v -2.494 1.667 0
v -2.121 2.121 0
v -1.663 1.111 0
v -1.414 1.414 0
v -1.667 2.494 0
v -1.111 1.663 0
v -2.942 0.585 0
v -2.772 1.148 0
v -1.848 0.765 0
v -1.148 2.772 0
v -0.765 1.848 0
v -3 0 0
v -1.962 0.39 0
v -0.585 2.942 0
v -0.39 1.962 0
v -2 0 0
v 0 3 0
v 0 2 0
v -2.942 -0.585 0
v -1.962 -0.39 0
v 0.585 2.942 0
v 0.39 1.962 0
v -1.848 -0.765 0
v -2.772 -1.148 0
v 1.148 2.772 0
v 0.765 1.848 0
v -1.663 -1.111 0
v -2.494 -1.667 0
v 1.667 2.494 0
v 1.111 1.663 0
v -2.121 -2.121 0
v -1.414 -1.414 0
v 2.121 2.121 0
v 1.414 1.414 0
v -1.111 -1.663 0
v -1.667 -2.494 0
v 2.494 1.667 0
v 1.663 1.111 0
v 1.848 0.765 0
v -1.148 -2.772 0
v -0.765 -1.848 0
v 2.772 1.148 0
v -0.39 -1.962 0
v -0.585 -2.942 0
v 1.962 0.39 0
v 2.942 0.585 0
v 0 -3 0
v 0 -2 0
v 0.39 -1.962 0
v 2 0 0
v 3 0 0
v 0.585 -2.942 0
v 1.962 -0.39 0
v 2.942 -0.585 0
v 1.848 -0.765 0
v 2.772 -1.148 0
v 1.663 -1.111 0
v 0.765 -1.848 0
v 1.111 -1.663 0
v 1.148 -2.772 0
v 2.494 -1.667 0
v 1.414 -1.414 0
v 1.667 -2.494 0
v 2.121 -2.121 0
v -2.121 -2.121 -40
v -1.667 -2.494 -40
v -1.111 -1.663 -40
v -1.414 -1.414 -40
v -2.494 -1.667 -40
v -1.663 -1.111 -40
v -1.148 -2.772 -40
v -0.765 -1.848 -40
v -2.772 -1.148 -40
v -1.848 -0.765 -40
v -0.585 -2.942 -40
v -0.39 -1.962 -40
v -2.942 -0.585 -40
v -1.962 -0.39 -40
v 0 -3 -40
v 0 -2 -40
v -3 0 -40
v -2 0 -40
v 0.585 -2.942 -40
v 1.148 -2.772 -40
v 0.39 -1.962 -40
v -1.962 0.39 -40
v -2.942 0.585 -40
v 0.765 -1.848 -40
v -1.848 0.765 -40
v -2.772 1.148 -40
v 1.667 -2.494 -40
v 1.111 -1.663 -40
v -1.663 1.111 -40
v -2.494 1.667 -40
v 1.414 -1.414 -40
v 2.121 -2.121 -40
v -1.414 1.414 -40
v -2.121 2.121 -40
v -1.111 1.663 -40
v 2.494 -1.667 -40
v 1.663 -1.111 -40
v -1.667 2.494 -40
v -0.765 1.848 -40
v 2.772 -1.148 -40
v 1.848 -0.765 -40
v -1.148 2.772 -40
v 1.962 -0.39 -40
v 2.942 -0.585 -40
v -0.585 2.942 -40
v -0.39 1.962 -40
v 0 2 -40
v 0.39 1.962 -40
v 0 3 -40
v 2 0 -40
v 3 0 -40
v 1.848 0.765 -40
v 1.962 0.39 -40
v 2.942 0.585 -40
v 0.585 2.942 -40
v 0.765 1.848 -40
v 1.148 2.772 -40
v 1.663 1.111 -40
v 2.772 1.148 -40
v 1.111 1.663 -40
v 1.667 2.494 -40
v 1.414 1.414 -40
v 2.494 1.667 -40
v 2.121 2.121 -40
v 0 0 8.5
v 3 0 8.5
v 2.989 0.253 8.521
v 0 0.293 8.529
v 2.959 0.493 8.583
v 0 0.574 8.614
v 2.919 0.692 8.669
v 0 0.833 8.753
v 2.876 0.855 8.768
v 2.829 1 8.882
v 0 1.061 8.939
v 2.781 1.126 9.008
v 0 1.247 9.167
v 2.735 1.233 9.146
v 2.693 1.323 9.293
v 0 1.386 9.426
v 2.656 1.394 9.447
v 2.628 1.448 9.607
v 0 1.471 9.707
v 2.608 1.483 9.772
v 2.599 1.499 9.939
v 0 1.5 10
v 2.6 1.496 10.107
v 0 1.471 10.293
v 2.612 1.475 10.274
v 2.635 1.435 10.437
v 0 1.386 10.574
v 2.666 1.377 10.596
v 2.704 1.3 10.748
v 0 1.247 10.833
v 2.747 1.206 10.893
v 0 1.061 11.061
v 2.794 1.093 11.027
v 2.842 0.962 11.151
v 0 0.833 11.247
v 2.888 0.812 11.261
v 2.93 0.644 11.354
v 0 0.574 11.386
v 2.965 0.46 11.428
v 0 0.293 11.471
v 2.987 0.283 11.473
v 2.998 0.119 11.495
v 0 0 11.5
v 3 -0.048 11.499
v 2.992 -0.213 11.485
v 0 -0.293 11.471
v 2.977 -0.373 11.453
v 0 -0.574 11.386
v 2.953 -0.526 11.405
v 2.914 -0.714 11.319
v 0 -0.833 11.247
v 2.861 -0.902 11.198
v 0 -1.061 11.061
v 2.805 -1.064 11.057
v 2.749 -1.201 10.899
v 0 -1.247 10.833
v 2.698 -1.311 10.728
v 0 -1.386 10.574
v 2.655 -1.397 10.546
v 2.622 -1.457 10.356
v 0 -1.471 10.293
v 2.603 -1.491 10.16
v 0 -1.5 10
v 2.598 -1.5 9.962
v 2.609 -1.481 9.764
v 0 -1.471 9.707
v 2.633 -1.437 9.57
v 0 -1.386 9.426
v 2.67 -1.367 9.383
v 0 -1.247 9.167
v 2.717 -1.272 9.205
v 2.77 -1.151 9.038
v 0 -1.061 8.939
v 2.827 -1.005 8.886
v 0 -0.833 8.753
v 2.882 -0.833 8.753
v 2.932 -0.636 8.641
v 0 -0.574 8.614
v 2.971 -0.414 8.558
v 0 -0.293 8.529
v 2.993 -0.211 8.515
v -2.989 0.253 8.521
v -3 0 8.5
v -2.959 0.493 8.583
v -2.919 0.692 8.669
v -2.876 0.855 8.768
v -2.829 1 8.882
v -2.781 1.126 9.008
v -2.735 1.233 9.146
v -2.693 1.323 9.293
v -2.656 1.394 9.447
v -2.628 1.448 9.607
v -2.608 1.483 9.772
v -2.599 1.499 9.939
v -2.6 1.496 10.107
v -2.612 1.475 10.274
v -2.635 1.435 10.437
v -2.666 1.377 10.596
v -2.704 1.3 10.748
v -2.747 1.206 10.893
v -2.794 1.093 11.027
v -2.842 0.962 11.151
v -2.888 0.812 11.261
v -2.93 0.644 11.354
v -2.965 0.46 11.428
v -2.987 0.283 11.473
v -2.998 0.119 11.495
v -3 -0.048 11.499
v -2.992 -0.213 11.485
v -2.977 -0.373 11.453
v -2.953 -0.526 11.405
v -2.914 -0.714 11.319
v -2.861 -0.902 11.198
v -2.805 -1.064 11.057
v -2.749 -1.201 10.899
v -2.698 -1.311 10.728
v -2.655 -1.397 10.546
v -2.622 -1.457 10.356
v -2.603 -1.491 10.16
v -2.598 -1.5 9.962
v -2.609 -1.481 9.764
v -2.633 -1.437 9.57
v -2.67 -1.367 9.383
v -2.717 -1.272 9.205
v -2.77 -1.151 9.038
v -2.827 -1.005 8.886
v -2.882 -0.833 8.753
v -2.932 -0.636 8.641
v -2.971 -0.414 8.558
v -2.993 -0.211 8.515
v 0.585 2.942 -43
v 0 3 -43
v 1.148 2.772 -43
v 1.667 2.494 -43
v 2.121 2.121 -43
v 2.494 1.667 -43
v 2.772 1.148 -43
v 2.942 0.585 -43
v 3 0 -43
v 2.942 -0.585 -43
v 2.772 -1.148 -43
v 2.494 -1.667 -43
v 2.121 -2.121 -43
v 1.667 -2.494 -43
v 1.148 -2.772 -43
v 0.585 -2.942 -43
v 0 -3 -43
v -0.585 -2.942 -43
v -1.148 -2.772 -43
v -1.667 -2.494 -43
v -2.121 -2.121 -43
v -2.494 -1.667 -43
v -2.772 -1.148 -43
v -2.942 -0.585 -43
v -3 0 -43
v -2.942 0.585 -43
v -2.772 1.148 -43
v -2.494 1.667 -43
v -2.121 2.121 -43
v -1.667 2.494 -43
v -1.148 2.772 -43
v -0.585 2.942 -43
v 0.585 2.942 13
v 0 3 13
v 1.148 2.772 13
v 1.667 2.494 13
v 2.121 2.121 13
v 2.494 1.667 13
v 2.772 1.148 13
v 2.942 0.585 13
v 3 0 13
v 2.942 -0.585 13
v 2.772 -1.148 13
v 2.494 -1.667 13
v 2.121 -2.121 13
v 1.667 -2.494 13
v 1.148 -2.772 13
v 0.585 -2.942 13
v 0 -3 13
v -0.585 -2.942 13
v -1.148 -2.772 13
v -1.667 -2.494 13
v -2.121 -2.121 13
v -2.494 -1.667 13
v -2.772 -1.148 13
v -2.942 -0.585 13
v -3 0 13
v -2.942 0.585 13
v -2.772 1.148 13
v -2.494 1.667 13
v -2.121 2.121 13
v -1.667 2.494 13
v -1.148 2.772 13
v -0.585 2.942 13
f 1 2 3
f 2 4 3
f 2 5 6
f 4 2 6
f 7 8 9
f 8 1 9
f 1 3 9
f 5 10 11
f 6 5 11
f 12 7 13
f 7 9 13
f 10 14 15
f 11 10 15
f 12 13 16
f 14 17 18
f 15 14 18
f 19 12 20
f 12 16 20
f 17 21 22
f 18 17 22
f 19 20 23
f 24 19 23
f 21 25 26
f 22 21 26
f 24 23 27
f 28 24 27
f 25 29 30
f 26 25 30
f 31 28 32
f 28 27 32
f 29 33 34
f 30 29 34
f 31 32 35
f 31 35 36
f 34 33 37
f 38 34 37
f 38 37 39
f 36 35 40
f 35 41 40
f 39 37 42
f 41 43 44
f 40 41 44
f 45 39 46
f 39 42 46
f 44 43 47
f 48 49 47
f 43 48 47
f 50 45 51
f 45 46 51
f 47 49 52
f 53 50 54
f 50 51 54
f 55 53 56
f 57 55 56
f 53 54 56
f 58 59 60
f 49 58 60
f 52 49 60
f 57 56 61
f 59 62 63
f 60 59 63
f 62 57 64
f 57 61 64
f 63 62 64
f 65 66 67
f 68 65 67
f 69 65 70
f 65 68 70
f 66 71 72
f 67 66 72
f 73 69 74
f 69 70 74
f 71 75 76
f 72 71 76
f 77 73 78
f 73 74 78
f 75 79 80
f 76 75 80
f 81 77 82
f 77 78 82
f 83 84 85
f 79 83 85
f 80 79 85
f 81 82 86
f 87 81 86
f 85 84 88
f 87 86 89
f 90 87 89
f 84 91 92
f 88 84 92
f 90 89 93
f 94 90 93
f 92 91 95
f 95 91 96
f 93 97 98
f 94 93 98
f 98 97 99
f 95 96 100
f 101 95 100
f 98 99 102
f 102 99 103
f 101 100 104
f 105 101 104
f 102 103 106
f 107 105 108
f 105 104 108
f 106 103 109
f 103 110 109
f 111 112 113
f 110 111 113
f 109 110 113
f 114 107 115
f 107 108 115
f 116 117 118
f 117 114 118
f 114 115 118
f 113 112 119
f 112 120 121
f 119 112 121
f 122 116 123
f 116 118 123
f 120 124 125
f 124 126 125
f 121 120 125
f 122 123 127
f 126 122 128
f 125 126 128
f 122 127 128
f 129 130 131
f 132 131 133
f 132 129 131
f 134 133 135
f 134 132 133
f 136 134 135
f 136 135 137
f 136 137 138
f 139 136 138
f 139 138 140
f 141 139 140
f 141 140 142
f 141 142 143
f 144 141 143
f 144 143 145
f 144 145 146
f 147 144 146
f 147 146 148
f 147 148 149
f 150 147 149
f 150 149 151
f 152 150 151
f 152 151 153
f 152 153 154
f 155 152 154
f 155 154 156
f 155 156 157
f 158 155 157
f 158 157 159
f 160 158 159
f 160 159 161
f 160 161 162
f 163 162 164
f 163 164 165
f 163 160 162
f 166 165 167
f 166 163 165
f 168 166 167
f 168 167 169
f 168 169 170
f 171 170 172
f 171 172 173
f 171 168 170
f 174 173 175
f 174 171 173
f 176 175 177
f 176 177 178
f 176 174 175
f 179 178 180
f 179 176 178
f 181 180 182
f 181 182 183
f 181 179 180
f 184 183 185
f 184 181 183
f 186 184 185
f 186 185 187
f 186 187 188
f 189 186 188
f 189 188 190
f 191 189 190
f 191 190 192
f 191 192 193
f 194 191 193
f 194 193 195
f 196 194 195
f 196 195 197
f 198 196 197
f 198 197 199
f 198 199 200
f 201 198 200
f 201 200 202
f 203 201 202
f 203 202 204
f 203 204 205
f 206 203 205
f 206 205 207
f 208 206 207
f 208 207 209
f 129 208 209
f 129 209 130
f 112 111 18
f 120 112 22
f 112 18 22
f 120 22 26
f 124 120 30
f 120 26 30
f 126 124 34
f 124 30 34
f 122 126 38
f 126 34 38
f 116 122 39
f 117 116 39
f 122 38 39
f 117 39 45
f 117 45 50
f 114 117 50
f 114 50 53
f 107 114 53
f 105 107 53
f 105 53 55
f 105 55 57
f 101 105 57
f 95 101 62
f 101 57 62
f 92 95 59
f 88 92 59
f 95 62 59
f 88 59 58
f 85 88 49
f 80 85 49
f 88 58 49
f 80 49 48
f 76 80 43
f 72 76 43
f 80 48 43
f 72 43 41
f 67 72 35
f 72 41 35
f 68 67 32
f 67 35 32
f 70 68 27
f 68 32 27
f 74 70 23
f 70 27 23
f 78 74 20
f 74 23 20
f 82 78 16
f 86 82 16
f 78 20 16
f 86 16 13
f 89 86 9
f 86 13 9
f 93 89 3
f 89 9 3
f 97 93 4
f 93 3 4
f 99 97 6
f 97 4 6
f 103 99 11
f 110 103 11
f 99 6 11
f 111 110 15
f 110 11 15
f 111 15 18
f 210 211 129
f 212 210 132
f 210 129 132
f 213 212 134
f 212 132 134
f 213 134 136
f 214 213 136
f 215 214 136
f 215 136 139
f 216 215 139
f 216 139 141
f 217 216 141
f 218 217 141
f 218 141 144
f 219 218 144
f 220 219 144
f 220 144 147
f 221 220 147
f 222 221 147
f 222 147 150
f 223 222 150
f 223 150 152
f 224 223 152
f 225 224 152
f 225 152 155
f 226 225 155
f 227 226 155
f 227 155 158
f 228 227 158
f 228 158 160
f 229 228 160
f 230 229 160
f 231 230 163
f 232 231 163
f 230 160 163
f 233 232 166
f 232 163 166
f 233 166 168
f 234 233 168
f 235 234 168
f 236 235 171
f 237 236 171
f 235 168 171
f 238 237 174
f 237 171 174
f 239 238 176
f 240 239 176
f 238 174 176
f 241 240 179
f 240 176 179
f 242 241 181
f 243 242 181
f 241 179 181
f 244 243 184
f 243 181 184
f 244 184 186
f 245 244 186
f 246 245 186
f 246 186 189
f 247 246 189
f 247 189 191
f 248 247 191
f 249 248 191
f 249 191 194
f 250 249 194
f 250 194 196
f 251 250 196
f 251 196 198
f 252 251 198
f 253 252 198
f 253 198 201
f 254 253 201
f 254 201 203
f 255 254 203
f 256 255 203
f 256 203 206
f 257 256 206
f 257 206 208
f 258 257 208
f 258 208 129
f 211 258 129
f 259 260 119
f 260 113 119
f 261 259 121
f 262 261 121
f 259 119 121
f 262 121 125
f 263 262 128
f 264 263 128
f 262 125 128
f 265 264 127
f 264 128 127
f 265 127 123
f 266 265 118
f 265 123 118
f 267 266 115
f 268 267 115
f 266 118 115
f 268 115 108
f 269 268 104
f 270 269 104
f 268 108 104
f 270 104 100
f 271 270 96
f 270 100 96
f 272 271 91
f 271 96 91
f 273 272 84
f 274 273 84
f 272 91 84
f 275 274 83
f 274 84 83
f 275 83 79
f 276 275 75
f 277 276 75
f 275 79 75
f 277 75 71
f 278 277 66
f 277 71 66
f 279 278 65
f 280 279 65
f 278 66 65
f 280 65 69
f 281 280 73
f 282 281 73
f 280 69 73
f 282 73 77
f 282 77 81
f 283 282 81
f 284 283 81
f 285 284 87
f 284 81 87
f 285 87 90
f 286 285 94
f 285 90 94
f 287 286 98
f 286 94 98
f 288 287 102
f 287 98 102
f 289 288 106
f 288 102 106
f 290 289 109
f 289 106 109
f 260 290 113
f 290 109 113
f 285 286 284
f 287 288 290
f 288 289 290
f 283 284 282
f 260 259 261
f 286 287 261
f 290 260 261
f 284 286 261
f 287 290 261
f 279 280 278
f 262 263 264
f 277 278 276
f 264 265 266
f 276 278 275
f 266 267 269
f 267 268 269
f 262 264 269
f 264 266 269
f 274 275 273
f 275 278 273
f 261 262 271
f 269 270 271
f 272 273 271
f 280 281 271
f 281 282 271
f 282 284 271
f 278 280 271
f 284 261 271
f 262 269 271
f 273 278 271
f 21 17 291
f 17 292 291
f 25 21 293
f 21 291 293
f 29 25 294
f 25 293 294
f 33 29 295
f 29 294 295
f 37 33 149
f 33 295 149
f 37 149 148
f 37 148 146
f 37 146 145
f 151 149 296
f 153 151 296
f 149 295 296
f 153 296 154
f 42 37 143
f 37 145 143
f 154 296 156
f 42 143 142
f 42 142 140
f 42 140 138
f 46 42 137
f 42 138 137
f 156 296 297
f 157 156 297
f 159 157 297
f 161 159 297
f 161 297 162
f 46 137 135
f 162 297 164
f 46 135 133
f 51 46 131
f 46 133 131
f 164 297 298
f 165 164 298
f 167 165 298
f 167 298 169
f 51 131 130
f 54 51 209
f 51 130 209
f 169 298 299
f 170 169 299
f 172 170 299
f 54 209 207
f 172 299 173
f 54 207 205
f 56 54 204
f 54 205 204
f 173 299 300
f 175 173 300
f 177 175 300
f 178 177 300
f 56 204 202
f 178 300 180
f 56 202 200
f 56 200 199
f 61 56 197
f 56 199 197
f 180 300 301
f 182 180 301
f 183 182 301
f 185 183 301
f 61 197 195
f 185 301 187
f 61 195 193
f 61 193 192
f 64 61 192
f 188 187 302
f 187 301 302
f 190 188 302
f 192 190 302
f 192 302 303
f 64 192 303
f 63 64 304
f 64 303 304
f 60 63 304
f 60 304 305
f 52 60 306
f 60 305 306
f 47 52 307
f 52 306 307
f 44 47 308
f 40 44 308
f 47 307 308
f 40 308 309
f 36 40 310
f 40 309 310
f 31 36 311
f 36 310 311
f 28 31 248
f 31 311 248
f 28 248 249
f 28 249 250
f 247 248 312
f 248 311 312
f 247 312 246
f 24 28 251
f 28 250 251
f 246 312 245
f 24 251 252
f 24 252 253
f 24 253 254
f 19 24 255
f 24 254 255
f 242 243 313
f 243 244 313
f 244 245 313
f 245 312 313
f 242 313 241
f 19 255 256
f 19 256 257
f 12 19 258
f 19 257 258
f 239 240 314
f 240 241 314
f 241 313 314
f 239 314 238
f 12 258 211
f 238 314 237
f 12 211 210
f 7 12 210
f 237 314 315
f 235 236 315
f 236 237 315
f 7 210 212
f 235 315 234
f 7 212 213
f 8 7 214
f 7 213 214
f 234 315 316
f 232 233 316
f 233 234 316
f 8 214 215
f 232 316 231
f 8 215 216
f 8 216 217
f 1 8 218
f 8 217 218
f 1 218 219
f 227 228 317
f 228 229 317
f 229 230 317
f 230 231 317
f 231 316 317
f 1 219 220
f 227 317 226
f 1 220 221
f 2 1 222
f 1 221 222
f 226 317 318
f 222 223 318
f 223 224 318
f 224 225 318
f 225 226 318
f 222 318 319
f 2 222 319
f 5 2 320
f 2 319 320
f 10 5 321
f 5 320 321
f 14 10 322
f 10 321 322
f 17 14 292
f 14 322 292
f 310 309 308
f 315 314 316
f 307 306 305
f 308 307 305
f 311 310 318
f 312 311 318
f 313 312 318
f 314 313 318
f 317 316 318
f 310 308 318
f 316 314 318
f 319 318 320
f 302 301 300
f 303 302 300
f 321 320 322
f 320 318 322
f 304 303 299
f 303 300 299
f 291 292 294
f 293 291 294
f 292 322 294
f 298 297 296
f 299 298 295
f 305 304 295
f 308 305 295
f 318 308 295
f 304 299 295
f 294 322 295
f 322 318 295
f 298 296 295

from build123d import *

# Parameters (mm, degrees)
SKETCH_2_R               = 1.5
CUT_EXTRUDE_1_DEPTH      = 4
CUT_EXTRUDE_1_DEPTH_BACK = 4


with BuildPart() as part:
    # 草圖1 → 旋轉1 (revolve)
    with BuildSketch(Plane(origin=(0, 0, 0), x_dir=(0, 0, -1), z_dir=(1, 0, 0))):
        Polygon((0, 2), (0, 3), (-13, 3), (-13, 0), (43, 0), (43, 3), (40, 3), (40, 2), align=None)
    revolve(axis=Axis((0, 0, 17.804347826), (0, 0, -1)))

    # 草圖2 → 除料-伸長1 (cut, two sides)
    with BuildSketch(Plane(origin=(0, 0, 0), x_dir=(0, 0, -1), z_dir=(1, 0, 0))) as cut_extrude_1_sk:
        with Locations((-10, 0)):
            Circle(SKETCH_2_R)
    extrude(amount=CUT_EXTRUDE_1_DEPTH, mode=Mode.SUBTRACT)
    extrude(cut_extrude_1_sk.sketch, amount=-CUT_EXTRUDE_1_DEPTH_BACK, mode=Mode.SUBTRACT)


solid = part.part
